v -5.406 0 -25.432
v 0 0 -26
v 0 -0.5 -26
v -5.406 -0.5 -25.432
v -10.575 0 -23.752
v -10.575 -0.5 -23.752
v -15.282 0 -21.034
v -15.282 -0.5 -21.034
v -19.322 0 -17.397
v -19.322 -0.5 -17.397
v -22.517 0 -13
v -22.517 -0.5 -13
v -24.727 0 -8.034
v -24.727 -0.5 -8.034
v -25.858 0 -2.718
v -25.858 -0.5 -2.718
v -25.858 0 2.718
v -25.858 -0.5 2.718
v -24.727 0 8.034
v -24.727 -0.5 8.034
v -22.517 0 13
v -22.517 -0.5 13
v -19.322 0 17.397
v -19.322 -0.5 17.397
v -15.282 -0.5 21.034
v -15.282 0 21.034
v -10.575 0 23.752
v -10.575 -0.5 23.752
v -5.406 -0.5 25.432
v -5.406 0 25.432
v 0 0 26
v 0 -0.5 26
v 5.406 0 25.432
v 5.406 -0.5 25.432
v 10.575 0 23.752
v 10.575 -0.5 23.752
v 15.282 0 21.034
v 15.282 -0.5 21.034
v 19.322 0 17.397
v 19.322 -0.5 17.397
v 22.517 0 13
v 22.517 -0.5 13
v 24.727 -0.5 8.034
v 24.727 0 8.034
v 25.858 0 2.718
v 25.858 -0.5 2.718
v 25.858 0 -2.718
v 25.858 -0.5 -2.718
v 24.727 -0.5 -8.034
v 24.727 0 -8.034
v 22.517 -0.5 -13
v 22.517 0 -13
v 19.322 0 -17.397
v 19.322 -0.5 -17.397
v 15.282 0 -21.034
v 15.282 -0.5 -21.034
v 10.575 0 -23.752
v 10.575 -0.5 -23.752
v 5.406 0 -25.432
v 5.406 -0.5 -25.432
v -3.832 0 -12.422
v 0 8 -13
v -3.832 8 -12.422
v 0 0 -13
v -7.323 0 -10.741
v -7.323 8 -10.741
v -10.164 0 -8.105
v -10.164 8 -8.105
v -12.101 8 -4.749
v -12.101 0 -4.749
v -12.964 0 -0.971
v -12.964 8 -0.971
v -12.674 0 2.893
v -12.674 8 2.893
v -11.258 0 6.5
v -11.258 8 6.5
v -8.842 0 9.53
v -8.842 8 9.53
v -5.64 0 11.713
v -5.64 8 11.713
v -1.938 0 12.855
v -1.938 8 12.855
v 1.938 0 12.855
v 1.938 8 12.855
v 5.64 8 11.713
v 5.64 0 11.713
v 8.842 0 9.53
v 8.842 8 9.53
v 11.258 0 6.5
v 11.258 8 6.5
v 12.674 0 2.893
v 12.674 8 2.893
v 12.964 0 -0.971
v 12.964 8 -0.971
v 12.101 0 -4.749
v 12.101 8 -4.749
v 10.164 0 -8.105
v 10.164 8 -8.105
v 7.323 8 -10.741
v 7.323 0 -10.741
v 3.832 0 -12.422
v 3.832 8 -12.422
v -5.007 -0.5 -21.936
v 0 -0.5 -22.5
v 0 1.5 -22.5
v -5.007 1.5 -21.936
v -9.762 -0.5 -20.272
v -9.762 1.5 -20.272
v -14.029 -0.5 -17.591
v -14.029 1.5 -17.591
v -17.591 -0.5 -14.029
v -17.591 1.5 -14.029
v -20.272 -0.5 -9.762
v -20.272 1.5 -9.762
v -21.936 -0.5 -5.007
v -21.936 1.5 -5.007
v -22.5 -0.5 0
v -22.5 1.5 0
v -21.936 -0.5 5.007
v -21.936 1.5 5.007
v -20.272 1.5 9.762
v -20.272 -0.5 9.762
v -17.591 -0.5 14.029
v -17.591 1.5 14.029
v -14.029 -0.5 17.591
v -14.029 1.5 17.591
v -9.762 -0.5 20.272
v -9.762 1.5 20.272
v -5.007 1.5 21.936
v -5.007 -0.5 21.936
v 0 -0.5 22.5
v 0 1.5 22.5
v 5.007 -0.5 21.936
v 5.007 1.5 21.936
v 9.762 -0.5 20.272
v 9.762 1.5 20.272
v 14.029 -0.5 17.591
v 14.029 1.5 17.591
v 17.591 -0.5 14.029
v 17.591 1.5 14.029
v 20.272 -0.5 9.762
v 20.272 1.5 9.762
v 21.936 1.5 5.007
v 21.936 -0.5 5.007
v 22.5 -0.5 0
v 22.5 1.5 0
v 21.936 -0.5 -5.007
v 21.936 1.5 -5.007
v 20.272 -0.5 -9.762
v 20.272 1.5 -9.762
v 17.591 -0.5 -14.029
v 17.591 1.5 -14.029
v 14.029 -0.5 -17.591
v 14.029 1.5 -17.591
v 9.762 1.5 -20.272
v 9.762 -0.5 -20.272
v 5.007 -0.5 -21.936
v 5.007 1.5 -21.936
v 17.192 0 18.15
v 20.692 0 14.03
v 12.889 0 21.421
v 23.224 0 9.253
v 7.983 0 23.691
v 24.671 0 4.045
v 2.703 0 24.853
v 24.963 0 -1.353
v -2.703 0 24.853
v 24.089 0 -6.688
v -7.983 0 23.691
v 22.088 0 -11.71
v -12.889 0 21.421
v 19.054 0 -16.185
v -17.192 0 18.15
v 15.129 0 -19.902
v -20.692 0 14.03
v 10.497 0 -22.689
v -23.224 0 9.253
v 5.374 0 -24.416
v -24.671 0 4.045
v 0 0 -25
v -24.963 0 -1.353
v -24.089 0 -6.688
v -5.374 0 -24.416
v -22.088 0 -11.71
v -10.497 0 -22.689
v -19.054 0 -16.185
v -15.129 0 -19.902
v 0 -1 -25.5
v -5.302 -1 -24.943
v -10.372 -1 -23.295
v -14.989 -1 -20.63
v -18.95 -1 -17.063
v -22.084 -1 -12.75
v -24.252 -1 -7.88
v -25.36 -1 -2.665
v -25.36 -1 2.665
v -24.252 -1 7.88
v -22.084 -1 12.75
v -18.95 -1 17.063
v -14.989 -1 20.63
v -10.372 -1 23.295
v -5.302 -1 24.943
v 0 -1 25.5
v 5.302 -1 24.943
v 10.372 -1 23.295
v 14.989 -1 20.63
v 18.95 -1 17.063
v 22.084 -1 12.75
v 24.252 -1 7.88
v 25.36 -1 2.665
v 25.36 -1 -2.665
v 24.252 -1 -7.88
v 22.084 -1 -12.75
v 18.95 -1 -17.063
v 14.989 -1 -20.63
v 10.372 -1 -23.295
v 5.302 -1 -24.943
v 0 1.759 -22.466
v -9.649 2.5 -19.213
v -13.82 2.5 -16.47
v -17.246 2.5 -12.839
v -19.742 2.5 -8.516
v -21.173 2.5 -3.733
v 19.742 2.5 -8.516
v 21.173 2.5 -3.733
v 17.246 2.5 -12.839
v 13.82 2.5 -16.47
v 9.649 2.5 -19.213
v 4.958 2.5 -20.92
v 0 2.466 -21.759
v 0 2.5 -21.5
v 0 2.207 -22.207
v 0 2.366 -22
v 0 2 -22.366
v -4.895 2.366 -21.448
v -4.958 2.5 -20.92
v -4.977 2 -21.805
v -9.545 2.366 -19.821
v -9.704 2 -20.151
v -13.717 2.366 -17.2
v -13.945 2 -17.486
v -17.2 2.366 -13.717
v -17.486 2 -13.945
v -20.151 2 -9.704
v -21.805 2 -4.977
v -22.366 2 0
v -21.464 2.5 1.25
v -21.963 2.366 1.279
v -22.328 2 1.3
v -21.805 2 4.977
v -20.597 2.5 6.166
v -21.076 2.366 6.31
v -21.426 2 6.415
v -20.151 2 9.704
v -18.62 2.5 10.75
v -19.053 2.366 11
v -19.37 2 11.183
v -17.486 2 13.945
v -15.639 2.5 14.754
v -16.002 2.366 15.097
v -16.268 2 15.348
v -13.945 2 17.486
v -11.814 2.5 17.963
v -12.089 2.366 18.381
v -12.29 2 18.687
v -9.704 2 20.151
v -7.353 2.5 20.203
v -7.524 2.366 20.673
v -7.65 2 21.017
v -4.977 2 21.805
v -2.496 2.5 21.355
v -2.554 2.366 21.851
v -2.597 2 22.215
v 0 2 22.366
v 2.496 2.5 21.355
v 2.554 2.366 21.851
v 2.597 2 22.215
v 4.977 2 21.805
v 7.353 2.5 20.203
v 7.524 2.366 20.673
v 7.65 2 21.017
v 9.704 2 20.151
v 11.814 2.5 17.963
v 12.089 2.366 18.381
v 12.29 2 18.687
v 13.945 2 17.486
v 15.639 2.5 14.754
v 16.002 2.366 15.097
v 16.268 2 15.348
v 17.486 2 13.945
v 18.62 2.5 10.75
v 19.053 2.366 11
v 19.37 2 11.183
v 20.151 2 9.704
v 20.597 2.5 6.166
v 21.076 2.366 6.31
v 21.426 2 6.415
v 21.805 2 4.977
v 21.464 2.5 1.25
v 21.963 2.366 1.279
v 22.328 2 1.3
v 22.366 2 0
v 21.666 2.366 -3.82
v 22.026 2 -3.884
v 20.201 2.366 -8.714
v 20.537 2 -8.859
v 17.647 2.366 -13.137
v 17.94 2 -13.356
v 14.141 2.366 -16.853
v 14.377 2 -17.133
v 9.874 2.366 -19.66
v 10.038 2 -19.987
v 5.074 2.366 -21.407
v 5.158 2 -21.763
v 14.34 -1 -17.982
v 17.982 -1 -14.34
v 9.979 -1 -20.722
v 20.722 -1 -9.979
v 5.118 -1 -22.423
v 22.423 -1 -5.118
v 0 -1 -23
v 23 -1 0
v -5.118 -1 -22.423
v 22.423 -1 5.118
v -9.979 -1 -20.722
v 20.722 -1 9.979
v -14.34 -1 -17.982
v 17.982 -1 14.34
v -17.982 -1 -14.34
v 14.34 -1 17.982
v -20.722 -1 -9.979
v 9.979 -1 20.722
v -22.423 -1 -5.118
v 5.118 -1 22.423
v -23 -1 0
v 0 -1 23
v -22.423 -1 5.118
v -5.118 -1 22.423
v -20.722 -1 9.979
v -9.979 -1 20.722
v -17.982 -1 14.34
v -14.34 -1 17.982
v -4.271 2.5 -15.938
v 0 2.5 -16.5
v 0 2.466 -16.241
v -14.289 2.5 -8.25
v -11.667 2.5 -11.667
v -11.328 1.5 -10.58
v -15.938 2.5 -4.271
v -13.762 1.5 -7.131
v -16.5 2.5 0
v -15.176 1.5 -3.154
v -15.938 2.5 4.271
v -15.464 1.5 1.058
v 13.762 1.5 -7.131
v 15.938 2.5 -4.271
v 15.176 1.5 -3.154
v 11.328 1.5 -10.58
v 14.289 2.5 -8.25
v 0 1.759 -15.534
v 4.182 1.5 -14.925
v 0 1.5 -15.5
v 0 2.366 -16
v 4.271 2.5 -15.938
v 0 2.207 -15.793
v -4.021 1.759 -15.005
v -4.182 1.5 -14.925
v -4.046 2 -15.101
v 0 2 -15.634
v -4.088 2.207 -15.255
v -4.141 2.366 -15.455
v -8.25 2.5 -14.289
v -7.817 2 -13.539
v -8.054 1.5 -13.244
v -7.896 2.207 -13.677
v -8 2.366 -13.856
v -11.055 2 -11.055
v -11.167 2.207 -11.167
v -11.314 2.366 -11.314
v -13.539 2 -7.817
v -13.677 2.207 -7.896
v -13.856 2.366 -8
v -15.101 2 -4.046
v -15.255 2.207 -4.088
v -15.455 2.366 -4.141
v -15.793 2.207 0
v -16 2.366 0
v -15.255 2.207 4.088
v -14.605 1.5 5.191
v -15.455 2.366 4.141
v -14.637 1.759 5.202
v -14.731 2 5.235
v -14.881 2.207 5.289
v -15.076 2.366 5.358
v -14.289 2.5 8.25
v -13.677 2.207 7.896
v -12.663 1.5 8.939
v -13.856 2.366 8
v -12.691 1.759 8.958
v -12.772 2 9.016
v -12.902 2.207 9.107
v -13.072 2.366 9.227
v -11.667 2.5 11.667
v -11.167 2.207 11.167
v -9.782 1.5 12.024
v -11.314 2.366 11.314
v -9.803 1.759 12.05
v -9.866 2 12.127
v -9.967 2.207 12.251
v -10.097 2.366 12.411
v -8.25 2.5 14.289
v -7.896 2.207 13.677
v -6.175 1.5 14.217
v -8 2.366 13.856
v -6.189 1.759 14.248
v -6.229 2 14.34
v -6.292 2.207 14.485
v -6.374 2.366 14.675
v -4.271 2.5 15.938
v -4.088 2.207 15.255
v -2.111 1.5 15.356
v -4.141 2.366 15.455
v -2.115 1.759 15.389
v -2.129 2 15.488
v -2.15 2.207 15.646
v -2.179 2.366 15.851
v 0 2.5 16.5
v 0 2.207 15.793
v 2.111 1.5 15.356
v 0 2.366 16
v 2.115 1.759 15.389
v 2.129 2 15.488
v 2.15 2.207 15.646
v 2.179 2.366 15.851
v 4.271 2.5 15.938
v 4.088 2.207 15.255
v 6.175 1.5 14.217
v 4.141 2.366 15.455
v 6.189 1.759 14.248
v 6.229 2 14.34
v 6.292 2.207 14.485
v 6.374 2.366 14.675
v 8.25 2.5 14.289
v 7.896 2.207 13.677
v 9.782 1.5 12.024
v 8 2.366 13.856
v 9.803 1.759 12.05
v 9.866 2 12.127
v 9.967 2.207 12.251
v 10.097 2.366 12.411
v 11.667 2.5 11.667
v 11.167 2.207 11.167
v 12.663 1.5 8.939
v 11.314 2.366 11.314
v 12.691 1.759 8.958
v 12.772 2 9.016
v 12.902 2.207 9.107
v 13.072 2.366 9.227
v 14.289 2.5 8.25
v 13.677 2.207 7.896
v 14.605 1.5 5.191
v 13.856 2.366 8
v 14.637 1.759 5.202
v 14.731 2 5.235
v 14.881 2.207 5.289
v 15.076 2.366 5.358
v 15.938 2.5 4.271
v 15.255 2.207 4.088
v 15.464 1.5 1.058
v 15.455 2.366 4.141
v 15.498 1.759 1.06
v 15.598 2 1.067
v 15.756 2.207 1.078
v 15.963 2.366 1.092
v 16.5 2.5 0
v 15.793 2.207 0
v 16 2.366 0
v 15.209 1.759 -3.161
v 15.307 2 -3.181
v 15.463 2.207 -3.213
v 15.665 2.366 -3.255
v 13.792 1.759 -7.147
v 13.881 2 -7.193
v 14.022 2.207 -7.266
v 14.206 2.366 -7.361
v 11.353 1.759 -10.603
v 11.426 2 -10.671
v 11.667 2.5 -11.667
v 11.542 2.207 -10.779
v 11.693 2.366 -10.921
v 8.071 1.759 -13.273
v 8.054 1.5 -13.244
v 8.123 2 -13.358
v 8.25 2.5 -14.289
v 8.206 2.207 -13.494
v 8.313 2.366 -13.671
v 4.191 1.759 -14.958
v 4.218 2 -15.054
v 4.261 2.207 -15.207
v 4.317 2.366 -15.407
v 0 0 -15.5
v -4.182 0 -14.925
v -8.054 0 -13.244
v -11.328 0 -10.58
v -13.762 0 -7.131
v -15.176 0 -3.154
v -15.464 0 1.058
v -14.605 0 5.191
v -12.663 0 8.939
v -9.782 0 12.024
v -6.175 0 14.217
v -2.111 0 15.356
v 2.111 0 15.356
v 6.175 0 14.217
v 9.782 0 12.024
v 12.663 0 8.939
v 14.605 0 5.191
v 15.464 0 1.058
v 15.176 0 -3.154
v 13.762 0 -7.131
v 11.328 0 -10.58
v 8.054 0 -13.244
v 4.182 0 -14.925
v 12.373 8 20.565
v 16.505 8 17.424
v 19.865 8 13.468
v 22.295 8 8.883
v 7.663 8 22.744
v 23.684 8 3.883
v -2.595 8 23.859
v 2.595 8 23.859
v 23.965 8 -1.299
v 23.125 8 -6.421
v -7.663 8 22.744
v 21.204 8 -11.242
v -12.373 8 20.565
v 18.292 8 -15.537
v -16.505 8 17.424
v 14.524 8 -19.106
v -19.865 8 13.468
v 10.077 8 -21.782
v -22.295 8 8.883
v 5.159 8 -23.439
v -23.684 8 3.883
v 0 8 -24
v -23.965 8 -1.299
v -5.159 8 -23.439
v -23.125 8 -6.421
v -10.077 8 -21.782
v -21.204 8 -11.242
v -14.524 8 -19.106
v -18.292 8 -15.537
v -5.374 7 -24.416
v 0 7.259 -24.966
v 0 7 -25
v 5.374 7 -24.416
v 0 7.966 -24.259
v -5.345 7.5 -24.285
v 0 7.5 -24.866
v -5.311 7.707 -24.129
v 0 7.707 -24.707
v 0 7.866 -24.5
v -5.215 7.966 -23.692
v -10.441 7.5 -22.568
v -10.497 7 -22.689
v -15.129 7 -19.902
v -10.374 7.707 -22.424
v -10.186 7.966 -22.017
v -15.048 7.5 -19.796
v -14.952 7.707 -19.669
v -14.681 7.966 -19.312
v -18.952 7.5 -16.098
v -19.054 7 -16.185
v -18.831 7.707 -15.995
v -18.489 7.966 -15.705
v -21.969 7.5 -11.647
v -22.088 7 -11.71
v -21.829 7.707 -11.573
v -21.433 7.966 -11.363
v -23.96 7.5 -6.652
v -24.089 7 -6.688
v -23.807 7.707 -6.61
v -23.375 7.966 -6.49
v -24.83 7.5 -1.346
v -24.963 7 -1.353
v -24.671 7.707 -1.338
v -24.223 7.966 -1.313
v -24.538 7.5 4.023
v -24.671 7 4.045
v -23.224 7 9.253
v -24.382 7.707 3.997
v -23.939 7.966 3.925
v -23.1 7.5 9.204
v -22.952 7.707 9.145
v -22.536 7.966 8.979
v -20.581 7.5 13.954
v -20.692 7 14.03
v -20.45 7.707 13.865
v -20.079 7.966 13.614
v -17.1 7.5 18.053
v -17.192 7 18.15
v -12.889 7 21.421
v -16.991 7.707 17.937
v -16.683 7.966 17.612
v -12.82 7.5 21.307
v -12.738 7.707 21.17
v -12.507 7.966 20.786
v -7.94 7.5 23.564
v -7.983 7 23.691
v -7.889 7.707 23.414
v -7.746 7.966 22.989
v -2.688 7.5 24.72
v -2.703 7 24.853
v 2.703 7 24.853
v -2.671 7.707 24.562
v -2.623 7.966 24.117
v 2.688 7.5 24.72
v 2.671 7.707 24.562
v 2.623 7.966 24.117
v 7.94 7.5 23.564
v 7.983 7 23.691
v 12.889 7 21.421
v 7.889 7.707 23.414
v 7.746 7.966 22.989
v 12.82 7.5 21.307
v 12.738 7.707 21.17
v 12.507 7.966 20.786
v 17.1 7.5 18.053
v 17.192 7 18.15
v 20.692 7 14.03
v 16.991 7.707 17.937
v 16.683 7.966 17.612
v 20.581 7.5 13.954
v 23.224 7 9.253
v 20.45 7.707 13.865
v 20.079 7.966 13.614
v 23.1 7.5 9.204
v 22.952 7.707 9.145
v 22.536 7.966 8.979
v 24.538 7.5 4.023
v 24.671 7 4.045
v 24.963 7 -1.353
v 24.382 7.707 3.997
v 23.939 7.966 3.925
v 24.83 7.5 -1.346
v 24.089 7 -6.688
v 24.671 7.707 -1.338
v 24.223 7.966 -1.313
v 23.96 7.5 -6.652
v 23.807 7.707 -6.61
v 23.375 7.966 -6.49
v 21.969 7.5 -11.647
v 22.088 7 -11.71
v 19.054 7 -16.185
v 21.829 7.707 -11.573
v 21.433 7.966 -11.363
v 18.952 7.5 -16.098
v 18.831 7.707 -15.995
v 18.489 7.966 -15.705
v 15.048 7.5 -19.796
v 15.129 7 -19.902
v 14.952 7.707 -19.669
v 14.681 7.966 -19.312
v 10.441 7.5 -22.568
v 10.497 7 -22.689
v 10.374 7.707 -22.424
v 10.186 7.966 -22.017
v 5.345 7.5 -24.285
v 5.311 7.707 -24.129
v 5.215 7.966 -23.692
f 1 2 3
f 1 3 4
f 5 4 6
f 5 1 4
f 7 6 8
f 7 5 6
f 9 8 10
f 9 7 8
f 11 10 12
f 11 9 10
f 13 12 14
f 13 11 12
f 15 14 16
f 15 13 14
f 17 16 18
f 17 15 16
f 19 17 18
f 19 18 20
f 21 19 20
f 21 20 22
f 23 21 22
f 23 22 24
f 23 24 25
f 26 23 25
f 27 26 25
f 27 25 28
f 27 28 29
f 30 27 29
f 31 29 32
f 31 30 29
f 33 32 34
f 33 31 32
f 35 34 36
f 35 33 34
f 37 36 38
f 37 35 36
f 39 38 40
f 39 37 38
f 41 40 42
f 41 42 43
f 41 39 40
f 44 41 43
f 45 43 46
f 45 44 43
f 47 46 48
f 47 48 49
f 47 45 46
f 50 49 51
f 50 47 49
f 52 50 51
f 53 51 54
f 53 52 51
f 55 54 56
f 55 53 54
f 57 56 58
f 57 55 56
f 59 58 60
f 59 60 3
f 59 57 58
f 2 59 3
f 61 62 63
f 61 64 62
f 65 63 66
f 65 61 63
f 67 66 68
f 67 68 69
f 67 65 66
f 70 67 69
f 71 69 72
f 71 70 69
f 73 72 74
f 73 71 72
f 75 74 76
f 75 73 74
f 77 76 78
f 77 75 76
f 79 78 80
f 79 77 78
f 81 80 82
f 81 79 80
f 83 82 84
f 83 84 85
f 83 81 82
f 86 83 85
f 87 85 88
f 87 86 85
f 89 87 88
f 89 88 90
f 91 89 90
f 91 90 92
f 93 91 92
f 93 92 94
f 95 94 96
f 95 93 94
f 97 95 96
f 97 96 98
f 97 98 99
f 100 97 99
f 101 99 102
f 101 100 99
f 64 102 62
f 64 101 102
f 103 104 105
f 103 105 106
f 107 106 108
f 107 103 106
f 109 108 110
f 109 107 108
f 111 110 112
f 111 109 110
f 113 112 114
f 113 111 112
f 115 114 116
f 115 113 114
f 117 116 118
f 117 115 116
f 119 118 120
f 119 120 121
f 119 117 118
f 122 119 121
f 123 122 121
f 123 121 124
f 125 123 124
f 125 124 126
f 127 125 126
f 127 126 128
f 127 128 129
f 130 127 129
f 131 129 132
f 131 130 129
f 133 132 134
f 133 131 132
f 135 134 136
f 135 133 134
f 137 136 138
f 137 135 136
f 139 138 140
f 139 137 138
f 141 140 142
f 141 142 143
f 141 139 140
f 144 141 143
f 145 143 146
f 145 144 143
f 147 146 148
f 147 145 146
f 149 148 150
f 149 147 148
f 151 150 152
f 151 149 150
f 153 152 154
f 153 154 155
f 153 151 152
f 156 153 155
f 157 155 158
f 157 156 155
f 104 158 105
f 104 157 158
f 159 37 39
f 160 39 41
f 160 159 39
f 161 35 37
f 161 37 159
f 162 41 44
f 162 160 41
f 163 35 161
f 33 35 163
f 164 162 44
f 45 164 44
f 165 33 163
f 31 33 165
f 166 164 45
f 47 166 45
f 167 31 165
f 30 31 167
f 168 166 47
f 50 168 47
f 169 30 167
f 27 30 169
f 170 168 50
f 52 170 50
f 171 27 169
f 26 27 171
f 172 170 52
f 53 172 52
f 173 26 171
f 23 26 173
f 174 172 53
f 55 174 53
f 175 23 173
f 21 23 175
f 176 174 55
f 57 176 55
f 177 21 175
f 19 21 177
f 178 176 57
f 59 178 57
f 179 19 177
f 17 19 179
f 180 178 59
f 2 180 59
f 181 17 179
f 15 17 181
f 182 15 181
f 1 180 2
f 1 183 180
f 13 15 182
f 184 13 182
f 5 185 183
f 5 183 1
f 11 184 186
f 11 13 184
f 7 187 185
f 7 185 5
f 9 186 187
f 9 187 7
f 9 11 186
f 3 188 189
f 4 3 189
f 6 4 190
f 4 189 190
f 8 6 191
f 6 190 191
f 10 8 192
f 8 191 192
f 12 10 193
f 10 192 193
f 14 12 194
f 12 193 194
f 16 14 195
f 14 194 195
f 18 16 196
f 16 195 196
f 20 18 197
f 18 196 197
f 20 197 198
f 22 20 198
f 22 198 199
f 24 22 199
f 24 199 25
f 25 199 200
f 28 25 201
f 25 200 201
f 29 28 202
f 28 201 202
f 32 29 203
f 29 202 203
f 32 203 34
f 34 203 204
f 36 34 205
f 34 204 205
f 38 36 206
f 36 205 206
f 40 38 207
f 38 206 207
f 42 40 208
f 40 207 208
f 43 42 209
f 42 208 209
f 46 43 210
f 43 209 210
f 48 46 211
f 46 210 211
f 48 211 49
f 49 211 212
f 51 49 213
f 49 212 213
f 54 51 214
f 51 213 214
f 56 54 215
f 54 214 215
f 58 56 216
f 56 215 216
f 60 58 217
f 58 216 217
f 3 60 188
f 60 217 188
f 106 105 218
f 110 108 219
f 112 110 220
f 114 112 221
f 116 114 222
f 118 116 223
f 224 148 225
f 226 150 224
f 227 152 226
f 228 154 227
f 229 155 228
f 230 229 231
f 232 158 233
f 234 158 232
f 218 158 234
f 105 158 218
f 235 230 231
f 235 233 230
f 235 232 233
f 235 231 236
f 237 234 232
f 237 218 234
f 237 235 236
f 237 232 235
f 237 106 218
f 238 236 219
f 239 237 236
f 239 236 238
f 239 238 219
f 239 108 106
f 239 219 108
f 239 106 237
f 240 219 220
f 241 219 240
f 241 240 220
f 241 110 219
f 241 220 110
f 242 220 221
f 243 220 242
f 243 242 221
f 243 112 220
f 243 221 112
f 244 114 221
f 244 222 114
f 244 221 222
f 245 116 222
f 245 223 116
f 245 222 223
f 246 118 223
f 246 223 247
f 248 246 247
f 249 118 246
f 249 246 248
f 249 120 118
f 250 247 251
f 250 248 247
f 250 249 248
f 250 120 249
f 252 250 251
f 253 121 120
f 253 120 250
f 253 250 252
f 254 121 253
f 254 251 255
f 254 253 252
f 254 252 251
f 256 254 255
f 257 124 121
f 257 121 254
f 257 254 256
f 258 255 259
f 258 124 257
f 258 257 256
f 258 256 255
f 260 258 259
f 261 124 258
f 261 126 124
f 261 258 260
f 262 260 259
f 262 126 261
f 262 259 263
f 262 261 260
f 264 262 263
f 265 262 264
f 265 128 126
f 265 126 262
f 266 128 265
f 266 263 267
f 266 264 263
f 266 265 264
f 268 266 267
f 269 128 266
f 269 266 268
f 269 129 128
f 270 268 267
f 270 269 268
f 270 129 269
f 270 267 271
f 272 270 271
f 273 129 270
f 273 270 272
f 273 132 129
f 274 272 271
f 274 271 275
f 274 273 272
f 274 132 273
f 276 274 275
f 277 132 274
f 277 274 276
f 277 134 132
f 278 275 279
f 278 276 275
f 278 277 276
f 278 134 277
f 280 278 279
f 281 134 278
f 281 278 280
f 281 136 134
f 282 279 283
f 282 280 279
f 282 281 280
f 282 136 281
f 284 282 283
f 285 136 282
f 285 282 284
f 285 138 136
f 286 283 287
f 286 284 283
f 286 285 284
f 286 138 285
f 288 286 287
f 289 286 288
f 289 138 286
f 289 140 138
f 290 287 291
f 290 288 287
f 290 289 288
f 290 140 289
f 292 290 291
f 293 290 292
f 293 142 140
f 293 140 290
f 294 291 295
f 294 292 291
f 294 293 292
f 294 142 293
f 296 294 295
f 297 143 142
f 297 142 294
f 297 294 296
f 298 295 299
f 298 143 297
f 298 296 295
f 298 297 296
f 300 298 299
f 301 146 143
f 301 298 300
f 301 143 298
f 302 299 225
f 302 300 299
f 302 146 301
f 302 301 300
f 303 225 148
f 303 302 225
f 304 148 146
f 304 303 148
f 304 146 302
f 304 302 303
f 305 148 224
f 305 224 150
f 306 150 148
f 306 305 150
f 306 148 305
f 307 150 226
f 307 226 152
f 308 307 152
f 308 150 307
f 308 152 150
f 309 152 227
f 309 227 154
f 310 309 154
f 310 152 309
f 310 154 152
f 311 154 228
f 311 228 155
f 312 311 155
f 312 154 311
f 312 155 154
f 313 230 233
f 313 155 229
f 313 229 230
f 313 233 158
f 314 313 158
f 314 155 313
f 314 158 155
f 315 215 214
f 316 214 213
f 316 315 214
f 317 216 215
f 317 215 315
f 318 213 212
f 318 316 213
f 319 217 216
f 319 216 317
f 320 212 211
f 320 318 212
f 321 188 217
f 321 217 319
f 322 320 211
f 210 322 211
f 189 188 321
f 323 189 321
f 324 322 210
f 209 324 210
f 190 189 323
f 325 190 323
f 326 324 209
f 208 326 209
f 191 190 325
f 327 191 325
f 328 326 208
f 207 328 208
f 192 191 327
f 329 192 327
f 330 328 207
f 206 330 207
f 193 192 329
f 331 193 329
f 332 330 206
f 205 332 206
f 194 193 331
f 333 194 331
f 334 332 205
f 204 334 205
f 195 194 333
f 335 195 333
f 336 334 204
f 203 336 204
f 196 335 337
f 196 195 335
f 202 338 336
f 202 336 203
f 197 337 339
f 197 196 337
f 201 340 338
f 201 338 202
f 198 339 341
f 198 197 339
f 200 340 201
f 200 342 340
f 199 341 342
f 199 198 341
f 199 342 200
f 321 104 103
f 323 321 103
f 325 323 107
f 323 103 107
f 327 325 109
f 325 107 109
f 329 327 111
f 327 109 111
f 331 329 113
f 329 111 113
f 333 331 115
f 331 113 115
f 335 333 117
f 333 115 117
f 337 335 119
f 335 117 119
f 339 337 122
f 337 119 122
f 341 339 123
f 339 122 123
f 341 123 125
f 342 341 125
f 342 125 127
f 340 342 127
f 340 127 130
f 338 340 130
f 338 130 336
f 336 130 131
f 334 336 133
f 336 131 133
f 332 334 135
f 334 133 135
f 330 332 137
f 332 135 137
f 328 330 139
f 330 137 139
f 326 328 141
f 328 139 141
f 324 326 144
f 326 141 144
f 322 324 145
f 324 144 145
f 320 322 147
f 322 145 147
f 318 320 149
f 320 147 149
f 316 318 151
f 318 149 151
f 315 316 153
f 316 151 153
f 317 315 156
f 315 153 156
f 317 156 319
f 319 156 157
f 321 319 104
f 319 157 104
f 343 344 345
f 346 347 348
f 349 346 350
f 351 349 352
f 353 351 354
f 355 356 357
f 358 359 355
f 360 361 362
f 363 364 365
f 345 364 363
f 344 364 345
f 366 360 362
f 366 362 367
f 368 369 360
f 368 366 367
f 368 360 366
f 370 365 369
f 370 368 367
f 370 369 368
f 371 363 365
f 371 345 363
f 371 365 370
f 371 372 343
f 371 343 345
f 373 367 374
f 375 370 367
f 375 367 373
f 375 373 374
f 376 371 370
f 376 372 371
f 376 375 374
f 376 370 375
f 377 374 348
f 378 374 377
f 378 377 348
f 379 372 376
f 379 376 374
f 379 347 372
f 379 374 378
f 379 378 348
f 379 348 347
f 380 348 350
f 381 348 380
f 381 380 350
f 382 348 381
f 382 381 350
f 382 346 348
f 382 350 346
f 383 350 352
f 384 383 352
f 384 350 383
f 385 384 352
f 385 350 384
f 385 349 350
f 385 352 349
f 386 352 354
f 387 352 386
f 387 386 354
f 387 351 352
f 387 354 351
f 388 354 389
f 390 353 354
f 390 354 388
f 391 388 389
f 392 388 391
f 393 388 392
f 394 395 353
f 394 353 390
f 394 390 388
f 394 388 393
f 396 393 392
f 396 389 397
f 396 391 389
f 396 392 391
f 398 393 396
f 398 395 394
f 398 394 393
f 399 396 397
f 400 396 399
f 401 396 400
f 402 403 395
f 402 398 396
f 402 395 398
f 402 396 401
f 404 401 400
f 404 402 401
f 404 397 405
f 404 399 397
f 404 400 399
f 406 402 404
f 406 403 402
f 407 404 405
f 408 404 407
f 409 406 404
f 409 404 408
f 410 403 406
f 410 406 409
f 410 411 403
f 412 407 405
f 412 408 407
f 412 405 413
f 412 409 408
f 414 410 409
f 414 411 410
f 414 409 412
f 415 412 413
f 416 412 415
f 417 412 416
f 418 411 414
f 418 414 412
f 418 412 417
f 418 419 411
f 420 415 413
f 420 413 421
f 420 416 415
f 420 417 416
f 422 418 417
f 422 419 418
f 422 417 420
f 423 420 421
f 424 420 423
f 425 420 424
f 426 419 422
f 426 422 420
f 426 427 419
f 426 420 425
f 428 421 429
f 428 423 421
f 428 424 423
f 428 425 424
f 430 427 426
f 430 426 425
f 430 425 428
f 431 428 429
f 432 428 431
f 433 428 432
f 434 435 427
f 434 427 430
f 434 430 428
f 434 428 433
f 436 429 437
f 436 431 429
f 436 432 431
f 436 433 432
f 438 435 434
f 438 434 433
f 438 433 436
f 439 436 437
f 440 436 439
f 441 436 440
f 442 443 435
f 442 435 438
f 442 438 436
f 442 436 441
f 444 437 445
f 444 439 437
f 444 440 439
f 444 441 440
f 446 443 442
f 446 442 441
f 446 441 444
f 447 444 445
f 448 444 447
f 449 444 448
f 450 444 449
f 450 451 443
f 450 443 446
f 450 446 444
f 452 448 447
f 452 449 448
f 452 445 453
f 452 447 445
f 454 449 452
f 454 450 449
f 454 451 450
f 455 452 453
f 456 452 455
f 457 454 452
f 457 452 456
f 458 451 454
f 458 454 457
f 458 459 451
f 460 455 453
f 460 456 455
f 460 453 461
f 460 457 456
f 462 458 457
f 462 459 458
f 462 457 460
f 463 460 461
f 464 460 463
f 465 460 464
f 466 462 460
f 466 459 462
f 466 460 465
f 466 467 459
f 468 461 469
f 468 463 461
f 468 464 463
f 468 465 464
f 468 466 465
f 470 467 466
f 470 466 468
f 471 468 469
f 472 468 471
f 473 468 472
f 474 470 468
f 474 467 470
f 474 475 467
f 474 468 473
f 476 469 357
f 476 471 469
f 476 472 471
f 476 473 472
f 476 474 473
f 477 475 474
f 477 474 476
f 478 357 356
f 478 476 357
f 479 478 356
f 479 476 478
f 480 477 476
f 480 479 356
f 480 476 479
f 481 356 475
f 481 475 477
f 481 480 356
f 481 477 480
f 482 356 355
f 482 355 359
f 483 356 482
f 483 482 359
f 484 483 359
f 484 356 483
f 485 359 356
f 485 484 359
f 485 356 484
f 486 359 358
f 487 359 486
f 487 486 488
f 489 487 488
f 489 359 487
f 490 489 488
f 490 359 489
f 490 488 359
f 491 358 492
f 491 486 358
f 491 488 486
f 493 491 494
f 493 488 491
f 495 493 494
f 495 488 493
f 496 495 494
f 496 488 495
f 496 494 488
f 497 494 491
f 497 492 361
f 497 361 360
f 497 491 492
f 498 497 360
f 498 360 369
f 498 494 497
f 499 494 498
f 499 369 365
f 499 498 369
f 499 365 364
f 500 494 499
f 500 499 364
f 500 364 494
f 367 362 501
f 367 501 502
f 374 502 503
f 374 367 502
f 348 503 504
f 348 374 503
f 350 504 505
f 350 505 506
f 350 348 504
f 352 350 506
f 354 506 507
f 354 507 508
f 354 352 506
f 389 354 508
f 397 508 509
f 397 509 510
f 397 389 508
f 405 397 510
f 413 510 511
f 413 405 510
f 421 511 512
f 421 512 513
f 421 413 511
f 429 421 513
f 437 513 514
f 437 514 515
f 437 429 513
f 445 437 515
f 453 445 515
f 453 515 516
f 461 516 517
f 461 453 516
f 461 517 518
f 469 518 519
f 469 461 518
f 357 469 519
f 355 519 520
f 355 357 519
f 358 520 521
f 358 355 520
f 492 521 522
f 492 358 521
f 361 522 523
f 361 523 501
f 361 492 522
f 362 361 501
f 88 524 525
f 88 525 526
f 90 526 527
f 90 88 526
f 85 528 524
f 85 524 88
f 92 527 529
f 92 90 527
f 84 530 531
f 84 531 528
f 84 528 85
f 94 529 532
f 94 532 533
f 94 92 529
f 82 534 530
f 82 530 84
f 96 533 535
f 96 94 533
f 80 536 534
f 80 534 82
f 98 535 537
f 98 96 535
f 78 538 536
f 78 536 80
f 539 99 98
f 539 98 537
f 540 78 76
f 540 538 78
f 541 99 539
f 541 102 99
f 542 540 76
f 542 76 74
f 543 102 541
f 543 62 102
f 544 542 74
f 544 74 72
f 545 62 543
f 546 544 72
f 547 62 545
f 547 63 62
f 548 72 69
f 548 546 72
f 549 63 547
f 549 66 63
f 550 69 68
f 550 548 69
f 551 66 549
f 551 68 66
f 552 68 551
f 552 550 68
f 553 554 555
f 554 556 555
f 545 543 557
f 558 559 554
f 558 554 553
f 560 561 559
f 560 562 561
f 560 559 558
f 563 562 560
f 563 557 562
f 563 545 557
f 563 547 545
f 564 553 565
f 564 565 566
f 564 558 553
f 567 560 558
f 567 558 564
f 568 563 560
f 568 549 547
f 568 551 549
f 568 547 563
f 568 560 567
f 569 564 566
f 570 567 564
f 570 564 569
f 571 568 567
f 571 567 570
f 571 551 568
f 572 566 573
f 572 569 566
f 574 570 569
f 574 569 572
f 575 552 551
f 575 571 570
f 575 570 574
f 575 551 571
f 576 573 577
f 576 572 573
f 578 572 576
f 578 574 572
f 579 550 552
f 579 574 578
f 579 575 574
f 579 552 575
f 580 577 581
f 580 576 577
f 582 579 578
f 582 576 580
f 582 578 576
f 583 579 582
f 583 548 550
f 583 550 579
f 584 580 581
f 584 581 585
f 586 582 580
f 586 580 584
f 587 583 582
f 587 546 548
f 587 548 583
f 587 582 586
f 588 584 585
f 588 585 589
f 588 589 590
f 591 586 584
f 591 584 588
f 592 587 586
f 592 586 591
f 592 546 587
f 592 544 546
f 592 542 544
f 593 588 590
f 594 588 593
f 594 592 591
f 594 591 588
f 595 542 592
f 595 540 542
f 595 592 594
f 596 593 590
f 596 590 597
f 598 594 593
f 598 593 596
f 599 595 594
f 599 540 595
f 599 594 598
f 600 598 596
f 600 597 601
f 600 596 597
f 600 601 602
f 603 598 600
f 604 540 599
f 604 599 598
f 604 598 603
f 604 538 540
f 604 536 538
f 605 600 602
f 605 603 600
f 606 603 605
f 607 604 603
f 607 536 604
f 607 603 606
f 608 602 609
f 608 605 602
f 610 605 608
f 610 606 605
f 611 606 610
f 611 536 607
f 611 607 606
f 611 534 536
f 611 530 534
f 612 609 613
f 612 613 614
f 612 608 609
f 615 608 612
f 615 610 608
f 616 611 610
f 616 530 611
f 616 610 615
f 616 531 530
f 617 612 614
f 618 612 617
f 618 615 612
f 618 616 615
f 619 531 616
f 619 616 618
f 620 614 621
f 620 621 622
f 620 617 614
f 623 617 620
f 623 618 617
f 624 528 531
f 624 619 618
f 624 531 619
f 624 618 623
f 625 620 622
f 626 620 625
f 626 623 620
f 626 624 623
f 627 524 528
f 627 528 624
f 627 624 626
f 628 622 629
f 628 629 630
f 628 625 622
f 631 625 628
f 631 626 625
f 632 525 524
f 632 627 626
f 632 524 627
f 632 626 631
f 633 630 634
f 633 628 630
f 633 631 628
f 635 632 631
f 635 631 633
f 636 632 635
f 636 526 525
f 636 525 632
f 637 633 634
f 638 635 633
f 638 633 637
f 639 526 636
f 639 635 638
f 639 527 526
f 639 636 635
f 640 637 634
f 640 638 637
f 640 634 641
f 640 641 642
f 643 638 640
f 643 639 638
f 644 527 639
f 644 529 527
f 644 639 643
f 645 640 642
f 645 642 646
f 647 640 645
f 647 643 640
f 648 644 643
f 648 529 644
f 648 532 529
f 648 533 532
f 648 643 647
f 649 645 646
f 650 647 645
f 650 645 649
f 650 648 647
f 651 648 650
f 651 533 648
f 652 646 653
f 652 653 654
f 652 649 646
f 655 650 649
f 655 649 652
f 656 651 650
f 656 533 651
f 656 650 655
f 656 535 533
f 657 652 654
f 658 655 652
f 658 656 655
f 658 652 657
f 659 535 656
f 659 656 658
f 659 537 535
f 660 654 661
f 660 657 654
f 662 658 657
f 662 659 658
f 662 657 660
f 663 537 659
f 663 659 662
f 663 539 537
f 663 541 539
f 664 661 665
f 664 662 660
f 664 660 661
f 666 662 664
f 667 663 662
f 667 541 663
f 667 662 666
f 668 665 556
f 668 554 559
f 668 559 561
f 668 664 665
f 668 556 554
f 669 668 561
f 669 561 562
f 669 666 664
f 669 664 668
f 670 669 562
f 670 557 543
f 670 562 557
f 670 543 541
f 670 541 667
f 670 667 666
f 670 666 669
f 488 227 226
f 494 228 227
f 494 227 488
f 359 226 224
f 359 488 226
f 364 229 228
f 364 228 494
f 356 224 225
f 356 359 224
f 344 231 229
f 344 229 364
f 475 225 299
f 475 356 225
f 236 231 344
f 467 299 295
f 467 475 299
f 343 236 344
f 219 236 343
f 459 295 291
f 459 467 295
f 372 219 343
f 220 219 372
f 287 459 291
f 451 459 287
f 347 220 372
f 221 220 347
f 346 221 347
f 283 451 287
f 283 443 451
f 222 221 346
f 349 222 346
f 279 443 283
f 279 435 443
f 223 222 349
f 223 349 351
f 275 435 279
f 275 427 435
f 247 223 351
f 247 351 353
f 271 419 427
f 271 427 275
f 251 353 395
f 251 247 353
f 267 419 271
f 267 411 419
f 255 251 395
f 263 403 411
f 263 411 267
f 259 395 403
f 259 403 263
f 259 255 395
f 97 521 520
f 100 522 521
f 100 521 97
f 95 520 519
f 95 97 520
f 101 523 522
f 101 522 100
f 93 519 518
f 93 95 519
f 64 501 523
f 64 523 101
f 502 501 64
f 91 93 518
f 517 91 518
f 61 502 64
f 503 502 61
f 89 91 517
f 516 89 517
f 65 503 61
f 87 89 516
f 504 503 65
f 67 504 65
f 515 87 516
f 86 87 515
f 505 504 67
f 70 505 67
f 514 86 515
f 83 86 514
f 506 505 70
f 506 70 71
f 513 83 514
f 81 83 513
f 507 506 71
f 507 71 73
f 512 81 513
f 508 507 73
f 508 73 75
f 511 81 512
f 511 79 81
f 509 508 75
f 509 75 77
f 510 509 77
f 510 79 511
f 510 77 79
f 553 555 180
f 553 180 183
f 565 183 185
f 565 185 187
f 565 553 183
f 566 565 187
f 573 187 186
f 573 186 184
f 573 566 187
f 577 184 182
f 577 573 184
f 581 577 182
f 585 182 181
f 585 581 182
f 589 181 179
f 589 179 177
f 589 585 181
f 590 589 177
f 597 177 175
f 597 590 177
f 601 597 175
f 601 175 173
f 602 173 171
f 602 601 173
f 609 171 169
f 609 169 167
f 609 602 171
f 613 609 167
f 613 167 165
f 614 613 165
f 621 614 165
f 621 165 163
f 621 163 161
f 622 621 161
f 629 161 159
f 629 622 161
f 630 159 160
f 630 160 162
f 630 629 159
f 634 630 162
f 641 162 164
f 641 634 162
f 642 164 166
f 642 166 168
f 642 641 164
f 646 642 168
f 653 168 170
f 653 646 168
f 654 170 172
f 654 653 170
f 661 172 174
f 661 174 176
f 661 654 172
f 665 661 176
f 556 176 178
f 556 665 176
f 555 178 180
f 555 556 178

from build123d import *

# Parameters (mm, degrees)
FILLET1_R     = 1
CHAMFER1_SIZE = 0.5


with BuildPart() as part:
    # Sketch1 → Revolve1 (revolve)
    with BuildSketch(Plane.XY):
        Polygon((-26, 0), (-25, 0), (-25, 8), (-13, 8), (-13, 0), (-15.5, 0), (-15.5, 2.5), (-22.5, 2.5), (-22.5, -1), (-26, -1), align=None)
    revolve(axis=Axis((0, 0, 0), (0, 1, 0)))

    # Fillet1
    fillet1_edges = [part.edges().sort_by_distance(p)[0] for p in [
        (15.5, 2.5, 0),
        (22.5, 2.5, 0),
        (25, 8, 0),
    ]]
    fillet(fillet1_edges, radius=FILLET1_R)

    # Chamfer1
    chamfer1_edges = [part.edges().sort_by_distance(p)[0] for p in [
        (22.5, -1, 0),
        (26, -1, 0),
    ]]
    chamfer(chamfer1_edges, length=CHAMFER1_SIZE)


solid = part.part
